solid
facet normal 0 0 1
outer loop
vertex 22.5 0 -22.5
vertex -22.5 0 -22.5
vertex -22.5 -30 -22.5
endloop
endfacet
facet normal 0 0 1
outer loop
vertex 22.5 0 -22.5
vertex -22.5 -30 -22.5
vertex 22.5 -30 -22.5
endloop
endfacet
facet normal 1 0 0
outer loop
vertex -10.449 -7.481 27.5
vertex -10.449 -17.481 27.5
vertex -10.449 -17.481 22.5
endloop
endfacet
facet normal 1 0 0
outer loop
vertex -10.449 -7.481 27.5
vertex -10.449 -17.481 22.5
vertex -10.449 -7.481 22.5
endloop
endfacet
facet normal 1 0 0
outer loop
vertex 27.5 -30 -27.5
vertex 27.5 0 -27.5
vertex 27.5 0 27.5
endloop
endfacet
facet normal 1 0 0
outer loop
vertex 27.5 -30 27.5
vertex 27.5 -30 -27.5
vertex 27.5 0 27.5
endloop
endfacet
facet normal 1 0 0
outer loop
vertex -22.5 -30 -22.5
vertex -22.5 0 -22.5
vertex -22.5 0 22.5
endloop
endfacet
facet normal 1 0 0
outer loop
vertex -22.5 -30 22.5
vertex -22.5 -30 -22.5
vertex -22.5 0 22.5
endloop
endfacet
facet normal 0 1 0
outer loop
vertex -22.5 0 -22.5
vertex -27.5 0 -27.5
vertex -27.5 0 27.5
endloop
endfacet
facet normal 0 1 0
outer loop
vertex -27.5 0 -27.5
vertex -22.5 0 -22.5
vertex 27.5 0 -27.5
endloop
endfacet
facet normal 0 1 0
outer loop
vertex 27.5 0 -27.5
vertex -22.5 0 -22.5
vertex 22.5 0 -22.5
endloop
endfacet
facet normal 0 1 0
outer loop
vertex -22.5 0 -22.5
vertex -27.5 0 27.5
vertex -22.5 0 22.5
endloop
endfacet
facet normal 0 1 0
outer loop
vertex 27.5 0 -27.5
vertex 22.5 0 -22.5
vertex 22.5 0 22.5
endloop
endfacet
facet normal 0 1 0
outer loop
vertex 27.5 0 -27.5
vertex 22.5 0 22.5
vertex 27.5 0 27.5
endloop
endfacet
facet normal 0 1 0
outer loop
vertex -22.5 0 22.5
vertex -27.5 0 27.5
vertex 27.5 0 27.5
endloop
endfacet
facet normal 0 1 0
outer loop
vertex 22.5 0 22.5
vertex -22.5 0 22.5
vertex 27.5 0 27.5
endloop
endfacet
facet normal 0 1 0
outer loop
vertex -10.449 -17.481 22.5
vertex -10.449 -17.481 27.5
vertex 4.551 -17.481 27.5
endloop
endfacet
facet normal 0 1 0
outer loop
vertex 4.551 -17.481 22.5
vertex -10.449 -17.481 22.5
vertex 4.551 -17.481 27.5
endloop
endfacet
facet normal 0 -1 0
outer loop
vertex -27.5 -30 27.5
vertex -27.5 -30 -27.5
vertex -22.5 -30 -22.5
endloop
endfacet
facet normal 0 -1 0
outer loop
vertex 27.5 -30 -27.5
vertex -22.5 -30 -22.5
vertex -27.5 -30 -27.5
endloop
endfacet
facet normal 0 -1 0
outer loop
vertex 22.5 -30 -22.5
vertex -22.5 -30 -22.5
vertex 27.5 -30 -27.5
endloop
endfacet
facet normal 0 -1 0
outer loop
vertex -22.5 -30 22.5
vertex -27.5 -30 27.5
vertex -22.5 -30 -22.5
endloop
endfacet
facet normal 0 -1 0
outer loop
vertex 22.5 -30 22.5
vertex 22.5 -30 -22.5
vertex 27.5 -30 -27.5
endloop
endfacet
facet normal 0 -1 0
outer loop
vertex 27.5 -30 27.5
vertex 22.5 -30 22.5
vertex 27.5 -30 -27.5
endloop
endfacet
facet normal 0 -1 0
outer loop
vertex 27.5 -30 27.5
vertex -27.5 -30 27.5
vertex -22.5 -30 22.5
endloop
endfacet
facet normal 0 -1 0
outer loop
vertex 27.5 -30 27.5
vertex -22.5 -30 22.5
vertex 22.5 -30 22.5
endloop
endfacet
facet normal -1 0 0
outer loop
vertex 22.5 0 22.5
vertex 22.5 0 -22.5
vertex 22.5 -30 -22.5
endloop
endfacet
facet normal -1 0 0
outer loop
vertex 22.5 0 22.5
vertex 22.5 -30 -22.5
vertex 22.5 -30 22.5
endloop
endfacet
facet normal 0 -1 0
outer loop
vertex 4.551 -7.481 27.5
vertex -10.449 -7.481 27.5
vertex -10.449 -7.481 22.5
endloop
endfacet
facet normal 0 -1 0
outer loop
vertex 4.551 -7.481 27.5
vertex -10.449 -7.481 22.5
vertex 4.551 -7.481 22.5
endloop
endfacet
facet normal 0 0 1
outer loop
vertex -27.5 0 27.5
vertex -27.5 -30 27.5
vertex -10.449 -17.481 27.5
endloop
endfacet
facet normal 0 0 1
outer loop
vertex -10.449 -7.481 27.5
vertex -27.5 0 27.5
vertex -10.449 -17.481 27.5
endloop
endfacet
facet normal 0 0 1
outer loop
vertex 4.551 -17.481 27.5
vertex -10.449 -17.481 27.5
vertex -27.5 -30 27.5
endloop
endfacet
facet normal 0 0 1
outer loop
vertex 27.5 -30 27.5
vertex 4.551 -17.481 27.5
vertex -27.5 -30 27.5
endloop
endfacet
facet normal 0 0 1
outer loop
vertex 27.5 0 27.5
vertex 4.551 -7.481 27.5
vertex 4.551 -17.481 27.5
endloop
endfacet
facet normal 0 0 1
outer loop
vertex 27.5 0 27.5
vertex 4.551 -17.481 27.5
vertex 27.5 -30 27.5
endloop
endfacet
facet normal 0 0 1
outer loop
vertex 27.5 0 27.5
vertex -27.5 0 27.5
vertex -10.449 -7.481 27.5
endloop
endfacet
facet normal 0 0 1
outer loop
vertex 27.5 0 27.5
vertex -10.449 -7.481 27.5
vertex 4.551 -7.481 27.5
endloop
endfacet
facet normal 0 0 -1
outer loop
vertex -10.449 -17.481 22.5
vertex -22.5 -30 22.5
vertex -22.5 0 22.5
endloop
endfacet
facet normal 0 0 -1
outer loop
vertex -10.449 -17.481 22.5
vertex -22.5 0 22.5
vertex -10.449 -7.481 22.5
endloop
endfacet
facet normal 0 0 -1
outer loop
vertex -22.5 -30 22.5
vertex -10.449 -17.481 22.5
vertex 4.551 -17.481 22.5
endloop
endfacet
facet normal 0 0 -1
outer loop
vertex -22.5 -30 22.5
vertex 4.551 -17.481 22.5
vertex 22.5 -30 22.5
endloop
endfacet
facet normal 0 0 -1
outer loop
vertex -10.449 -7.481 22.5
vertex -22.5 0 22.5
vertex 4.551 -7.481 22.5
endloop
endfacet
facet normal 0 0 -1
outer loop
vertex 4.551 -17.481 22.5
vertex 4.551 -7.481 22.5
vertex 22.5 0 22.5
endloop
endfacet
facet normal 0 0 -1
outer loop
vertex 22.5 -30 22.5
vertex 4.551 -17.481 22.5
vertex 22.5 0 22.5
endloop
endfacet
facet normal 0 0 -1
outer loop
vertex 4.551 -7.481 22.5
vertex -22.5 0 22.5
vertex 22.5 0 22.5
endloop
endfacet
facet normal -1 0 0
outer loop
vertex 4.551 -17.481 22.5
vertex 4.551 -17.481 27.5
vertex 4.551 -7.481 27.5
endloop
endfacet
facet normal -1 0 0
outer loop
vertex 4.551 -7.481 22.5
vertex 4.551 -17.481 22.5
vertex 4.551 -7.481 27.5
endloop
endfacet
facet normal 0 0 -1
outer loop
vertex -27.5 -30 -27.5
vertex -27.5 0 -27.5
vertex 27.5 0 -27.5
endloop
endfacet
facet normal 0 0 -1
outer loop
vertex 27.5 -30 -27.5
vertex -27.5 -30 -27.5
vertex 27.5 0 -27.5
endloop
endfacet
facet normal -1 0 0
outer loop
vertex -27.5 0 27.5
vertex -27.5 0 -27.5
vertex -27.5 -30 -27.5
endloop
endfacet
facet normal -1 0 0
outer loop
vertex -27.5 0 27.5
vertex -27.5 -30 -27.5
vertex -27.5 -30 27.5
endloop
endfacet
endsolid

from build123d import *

# Parameters (mm, degrees)
F0_W     = 55
F0_H     = 55
F0_W_2   = 45
F0_H_2   = 45
F1_DEPTH = 30
F2_W     = 15
F2_H     = 10
F3_DEPTH = 25


# Not quite as in the source:
# - a feature names something its author has since deleted; it is built from what else it names


with BuildPart() as f1:
    # F0 (on Front) → F1 (new body)
    with BuildSketch(Plane.XZ):
        Rectangle(F0_W, F0_H)
        Rectangle(F0_W_2, F0_H_2, mode=Mode.SUBTRACT)
    extrude(amount=F1_DEPTH)

    # F2 (on face) → F3 (cut)
    with BuildSketch(Plane.XY.offset(27.5)):
        with Locations((-2.9486052878, -12.4806062132)):
            Rectangle(F2_W, F2_H)
    extrude(amount=-F3_DEPTH, mode=Mode.SUBTRACT)


solid = f1.part
